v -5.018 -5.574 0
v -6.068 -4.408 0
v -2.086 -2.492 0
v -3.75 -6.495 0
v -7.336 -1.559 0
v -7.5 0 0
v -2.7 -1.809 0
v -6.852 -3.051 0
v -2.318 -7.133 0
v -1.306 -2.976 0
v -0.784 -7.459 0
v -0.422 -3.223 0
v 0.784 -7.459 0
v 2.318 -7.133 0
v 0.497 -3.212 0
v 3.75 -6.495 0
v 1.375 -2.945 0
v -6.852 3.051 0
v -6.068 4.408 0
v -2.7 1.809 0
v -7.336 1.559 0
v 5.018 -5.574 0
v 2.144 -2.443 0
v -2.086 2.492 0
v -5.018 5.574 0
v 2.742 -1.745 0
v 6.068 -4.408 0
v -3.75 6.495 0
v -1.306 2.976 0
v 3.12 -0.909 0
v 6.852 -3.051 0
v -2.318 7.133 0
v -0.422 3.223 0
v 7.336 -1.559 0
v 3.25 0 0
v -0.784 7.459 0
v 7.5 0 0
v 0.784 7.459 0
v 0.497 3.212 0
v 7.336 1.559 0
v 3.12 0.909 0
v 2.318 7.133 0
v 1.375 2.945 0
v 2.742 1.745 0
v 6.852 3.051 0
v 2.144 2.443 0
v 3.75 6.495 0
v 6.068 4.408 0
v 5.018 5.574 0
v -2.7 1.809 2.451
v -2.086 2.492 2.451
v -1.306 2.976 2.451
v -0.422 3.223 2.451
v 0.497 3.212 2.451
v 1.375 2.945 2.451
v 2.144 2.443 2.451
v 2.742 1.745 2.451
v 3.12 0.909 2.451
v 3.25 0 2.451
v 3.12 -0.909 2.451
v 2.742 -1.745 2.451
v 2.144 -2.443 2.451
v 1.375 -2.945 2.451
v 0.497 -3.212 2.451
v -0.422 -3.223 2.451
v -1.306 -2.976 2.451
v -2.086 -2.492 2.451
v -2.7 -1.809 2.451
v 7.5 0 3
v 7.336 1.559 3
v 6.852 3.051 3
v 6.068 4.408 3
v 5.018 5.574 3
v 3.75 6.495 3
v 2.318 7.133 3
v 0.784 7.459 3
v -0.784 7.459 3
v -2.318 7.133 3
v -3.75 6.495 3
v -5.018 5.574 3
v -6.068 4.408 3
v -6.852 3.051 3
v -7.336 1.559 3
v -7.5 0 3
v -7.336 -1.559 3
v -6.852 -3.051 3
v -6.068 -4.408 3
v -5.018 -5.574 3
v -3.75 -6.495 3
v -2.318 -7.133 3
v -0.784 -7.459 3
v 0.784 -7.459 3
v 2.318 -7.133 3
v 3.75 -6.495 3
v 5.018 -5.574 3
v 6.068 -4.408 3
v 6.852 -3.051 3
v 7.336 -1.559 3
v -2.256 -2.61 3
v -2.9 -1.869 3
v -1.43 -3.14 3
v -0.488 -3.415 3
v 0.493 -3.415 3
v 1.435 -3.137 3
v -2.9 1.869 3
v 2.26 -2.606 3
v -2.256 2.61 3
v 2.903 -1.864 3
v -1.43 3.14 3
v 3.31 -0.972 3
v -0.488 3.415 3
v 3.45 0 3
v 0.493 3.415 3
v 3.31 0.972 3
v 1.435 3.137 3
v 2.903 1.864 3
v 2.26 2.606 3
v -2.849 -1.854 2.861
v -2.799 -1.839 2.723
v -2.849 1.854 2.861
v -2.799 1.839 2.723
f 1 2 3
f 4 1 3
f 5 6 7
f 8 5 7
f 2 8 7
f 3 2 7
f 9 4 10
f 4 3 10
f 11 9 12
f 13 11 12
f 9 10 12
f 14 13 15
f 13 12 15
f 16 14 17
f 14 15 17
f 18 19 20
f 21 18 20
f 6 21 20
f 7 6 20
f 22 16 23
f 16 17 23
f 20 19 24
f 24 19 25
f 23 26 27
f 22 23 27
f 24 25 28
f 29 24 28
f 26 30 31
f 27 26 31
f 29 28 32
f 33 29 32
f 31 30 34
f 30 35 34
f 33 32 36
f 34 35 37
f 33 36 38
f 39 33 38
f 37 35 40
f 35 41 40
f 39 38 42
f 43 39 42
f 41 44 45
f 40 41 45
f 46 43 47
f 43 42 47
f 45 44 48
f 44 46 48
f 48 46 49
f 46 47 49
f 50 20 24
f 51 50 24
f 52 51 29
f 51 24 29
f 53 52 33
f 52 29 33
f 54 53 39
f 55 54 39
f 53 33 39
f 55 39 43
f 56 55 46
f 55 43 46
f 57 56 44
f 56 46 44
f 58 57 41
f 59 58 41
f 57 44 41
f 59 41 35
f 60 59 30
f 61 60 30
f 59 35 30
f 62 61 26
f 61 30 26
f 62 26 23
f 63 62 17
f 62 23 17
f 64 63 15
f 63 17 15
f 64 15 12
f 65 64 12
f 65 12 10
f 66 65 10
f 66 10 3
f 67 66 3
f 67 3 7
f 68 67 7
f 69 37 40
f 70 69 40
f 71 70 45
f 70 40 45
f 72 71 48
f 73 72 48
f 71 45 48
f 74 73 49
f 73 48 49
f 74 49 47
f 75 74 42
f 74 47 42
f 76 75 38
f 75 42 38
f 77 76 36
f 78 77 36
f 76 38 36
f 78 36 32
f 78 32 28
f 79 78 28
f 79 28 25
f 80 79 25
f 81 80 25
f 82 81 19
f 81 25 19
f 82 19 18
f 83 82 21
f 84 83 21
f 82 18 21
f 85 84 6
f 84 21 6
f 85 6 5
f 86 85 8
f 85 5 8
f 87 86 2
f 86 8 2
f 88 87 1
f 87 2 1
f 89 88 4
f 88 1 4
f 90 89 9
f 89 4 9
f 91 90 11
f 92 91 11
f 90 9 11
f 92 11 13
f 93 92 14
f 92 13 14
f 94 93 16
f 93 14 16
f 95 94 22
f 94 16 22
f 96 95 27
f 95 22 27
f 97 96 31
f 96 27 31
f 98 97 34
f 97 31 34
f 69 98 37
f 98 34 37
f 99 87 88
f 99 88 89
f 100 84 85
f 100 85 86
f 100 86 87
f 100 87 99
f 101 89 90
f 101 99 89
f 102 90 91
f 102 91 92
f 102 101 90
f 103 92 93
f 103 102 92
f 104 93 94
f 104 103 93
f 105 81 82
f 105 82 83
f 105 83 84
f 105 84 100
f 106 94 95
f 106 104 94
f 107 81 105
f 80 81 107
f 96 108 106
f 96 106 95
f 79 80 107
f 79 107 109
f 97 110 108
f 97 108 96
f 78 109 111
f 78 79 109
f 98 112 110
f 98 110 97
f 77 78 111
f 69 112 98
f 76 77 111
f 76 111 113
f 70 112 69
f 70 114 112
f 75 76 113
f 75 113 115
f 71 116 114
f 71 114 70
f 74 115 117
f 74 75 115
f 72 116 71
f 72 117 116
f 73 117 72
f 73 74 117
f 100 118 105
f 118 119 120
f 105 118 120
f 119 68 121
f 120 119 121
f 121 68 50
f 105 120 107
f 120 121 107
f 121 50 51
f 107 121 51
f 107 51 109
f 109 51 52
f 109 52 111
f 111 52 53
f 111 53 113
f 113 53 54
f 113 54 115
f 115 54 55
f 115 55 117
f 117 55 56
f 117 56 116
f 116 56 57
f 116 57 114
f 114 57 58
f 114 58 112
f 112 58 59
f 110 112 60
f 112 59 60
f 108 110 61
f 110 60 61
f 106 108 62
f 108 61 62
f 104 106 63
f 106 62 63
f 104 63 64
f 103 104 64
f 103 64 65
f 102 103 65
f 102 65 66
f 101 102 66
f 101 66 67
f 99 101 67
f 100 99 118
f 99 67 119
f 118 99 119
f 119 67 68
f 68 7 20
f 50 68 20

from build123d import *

# Parameters (mm, degrees)
SKETCH1_R           = 7.5
BOSS_EXTRUDE1_DEPTH = 3
CHAMFER3_SIZE       = 0.2
CHAMFER3_SIZE2      = 0.549495484


with BuildPart() as part:
    # Sketch1 → Boss-Extrude1 (new body)
    with BuildSketch(Plane.XY):
        Circle(SKETCH1_R)
        with BuildLine():
            Line((-2.7, -1.809005252), (-2.7, 1.809005252))
            ThreePointArc((-2.7, 1.809005252), (3.25, 0), (-2.7, -1.809005252))
        make_face(mode=Mode.SUBTRACT)
    extrude(amount=BOSS_EXTRUDE1_DEPTH)

    # Chamfer3
    chamfer3_edges = [part.edges().sort_by_distance(p)[0] for p in [
        (3.25, 0, 3),
        (-2.7, 0, 3),
    ]]
    chamfer3_side = [part.faces().sort_by_distance(p)[0] for p in [
        (-7.287867966, 0, 3),
    ]]
    chamfer(chamfer3_edges, length=CHAMFER3_SIZE, length2=CHAMFER3_SIZE2, reference=chamfer3_side[0])


solid = part.part
